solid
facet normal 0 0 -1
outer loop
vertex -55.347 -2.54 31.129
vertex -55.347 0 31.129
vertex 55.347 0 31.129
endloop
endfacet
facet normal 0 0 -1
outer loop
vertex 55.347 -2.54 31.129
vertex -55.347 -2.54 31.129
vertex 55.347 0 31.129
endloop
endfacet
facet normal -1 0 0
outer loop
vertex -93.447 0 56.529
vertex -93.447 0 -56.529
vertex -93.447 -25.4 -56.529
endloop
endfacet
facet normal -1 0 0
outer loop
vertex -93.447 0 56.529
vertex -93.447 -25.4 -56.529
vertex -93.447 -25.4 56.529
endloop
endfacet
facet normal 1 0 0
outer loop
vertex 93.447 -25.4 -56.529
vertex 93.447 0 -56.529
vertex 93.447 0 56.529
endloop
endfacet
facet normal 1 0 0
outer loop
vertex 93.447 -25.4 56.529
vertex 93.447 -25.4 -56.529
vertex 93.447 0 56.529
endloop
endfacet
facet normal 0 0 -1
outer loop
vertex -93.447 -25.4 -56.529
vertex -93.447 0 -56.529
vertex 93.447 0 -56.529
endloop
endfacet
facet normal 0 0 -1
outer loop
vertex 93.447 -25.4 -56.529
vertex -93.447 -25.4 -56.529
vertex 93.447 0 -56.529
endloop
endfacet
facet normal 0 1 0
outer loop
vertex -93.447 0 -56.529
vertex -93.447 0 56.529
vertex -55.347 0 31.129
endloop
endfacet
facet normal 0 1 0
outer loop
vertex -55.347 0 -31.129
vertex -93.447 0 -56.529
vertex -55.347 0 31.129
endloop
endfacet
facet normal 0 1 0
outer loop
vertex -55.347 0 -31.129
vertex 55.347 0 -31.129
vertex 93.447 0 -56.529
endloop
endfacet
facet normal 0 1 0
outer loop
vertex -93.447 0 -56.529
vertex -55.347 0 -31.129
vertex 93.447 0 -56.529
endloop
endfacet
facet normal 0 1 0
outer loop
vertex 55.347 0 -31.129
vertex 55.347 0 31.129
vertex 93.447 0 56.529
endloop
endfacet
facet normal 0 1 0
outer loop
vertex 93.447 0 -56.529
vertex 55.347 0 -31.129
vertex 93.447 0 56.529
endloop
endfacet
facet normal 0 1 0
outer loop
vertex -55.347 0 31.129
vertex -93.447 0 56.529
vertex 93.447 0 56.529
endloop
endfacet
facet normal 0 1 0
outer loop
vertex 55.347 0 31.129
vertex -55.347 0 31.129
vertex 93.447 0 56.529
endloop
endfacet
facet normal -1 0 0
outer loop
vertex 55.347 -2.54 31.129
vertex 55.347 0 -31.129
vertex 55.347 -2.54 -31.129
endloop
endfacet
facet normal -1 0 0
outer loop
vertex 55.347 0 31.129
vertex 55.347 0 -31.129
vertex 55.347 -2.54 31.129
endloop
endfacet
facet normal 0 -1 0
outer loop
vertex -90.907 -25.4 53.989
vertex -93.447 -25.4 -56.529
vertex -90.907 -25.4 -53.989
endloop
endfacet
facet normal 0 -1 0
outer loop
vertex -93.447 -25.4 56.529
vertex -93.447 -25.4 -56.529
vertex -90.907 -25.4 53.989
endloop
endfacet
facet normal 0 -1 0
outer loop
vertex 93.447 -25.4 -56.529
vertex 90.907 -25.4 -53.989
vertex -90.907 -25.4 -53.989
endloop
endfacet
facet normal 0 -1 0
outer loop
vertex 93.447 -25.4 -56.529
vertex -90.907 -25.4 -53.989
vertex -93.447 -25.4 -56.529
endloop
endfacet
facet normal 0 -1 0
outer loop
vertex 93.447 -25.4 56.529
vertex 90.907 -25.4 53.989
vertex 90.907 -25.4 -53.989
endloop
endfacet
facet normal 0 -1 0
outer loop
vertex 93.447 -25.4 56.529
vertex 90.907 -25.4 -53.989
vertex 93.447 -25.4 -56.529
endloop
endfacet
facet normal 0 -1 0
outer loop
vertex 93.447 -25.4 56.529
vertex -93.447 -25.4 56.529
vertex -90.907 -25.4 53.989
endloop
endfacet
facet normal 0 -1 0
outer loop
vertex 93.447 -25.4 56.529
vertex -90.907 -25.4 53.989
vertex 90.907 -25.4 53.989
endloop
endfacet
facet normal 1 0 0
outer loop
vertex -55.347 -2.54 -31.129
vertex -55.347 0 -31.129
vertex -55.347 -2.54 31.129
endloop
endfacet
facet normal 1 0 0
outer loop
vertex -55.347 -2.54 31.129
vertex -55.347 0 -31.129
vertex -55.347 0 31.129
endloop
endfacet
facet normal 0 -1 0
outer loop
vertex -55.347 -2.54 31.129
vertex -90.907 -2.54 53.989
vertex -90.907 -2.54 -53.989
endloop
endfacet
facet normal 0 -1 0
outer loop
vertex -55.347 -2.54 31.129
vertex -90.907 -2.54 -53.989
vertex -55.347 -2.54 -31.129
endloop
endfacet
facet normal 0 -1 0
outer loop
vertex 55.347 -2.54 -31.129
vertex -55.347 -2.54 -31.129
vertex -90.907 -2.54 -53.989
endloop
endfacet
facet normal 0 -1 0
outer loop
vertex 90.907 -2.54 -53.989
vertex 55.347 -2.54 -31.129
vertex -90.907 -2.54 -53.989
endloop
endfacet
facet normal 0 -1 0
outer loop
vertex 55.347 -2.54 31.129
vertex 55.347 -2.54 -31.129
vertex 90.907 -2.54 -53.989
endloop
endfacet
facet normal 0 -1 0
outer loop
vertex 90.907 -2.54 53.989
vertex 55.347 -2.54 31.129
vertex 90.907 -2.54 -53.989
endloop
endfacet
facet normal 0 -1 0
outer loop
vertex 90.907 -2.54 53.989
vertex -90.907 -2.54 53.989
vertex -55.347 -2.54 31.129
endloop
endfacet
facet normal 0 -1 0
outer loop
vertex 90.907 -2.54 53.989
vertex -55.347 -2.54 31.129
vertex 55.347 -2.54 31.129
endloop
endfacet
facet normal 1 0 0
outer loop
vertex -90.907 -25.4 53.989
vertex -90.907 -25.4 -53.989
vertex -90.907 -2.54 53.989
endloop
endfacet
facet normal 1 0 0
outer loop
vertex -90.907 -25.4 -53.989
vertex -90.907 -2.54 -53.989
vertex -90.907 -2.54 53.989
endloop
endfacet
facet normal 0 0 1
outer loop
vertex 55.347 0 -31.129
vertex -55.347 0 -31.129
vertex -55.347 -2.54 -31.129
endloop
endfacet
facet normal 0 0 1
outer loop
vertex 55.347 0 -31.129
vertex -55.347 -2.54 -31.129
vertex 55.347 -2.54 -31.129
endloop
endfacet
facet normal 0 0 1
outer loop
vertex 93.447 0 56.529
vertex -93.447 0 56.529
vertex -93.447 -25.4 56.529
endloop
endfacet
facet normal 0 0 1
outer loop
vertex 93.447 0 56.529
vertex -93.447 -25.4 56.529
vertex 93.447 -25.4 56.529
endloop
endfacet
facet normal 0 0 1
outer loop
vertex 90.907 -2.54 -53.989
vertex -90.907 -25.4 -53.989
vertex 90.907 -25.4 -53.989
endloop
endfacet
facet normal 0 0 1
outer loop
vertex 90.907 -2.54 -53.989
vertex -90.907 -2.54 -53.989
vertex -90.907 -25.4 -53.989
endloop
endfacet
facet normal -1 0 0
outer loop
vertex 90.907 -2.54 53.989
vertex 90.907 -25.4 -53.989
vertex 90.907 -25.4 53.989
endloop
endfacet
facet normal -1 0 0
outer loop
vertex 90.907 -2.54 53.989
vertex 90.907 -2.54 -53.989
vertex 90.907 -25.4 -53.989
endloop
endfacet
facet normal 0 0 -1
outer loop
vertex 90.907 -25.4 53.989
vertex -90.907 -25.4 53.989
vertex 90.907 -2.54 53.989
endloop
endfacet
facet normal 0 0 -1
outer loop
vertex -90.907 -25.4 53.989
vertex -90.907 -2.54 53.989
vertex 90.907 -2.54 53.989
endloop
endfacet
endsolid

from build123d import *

# Parameters (mm, degrees)
F1_W     = 186.8932
F1_H     = 113.057654
F2_DEPTH = 25.4
F3_T     = -2.54
F0_W     = 110.6932
F0_H     = 62.257654
F4_DEPTH = 25.401


with BuildPart() as f2:
    # F1 (on Front) → F2 (new body)
    with BuildSketch(Plane.XZ):
        Rectangle(F1_W, F1_H)
    extrude(amount=F2_DEPTH)

    # F3
    f3_openings = [f2.faces().sort_by_distance(p)[0] for p in [
        (0, -25.4, 0),
    ]]
    offset(amount=F3_T, openings=f3_openings)

    # F0 (on Front) → F4 (cut, through all)
    with BuildSketch(Plane.XZ):
        Rectangle(F0_W, F0_H)
    extrude(amount=F4_DEPTH, mode=Mode.SUBTRACT)


solid = f2.part
